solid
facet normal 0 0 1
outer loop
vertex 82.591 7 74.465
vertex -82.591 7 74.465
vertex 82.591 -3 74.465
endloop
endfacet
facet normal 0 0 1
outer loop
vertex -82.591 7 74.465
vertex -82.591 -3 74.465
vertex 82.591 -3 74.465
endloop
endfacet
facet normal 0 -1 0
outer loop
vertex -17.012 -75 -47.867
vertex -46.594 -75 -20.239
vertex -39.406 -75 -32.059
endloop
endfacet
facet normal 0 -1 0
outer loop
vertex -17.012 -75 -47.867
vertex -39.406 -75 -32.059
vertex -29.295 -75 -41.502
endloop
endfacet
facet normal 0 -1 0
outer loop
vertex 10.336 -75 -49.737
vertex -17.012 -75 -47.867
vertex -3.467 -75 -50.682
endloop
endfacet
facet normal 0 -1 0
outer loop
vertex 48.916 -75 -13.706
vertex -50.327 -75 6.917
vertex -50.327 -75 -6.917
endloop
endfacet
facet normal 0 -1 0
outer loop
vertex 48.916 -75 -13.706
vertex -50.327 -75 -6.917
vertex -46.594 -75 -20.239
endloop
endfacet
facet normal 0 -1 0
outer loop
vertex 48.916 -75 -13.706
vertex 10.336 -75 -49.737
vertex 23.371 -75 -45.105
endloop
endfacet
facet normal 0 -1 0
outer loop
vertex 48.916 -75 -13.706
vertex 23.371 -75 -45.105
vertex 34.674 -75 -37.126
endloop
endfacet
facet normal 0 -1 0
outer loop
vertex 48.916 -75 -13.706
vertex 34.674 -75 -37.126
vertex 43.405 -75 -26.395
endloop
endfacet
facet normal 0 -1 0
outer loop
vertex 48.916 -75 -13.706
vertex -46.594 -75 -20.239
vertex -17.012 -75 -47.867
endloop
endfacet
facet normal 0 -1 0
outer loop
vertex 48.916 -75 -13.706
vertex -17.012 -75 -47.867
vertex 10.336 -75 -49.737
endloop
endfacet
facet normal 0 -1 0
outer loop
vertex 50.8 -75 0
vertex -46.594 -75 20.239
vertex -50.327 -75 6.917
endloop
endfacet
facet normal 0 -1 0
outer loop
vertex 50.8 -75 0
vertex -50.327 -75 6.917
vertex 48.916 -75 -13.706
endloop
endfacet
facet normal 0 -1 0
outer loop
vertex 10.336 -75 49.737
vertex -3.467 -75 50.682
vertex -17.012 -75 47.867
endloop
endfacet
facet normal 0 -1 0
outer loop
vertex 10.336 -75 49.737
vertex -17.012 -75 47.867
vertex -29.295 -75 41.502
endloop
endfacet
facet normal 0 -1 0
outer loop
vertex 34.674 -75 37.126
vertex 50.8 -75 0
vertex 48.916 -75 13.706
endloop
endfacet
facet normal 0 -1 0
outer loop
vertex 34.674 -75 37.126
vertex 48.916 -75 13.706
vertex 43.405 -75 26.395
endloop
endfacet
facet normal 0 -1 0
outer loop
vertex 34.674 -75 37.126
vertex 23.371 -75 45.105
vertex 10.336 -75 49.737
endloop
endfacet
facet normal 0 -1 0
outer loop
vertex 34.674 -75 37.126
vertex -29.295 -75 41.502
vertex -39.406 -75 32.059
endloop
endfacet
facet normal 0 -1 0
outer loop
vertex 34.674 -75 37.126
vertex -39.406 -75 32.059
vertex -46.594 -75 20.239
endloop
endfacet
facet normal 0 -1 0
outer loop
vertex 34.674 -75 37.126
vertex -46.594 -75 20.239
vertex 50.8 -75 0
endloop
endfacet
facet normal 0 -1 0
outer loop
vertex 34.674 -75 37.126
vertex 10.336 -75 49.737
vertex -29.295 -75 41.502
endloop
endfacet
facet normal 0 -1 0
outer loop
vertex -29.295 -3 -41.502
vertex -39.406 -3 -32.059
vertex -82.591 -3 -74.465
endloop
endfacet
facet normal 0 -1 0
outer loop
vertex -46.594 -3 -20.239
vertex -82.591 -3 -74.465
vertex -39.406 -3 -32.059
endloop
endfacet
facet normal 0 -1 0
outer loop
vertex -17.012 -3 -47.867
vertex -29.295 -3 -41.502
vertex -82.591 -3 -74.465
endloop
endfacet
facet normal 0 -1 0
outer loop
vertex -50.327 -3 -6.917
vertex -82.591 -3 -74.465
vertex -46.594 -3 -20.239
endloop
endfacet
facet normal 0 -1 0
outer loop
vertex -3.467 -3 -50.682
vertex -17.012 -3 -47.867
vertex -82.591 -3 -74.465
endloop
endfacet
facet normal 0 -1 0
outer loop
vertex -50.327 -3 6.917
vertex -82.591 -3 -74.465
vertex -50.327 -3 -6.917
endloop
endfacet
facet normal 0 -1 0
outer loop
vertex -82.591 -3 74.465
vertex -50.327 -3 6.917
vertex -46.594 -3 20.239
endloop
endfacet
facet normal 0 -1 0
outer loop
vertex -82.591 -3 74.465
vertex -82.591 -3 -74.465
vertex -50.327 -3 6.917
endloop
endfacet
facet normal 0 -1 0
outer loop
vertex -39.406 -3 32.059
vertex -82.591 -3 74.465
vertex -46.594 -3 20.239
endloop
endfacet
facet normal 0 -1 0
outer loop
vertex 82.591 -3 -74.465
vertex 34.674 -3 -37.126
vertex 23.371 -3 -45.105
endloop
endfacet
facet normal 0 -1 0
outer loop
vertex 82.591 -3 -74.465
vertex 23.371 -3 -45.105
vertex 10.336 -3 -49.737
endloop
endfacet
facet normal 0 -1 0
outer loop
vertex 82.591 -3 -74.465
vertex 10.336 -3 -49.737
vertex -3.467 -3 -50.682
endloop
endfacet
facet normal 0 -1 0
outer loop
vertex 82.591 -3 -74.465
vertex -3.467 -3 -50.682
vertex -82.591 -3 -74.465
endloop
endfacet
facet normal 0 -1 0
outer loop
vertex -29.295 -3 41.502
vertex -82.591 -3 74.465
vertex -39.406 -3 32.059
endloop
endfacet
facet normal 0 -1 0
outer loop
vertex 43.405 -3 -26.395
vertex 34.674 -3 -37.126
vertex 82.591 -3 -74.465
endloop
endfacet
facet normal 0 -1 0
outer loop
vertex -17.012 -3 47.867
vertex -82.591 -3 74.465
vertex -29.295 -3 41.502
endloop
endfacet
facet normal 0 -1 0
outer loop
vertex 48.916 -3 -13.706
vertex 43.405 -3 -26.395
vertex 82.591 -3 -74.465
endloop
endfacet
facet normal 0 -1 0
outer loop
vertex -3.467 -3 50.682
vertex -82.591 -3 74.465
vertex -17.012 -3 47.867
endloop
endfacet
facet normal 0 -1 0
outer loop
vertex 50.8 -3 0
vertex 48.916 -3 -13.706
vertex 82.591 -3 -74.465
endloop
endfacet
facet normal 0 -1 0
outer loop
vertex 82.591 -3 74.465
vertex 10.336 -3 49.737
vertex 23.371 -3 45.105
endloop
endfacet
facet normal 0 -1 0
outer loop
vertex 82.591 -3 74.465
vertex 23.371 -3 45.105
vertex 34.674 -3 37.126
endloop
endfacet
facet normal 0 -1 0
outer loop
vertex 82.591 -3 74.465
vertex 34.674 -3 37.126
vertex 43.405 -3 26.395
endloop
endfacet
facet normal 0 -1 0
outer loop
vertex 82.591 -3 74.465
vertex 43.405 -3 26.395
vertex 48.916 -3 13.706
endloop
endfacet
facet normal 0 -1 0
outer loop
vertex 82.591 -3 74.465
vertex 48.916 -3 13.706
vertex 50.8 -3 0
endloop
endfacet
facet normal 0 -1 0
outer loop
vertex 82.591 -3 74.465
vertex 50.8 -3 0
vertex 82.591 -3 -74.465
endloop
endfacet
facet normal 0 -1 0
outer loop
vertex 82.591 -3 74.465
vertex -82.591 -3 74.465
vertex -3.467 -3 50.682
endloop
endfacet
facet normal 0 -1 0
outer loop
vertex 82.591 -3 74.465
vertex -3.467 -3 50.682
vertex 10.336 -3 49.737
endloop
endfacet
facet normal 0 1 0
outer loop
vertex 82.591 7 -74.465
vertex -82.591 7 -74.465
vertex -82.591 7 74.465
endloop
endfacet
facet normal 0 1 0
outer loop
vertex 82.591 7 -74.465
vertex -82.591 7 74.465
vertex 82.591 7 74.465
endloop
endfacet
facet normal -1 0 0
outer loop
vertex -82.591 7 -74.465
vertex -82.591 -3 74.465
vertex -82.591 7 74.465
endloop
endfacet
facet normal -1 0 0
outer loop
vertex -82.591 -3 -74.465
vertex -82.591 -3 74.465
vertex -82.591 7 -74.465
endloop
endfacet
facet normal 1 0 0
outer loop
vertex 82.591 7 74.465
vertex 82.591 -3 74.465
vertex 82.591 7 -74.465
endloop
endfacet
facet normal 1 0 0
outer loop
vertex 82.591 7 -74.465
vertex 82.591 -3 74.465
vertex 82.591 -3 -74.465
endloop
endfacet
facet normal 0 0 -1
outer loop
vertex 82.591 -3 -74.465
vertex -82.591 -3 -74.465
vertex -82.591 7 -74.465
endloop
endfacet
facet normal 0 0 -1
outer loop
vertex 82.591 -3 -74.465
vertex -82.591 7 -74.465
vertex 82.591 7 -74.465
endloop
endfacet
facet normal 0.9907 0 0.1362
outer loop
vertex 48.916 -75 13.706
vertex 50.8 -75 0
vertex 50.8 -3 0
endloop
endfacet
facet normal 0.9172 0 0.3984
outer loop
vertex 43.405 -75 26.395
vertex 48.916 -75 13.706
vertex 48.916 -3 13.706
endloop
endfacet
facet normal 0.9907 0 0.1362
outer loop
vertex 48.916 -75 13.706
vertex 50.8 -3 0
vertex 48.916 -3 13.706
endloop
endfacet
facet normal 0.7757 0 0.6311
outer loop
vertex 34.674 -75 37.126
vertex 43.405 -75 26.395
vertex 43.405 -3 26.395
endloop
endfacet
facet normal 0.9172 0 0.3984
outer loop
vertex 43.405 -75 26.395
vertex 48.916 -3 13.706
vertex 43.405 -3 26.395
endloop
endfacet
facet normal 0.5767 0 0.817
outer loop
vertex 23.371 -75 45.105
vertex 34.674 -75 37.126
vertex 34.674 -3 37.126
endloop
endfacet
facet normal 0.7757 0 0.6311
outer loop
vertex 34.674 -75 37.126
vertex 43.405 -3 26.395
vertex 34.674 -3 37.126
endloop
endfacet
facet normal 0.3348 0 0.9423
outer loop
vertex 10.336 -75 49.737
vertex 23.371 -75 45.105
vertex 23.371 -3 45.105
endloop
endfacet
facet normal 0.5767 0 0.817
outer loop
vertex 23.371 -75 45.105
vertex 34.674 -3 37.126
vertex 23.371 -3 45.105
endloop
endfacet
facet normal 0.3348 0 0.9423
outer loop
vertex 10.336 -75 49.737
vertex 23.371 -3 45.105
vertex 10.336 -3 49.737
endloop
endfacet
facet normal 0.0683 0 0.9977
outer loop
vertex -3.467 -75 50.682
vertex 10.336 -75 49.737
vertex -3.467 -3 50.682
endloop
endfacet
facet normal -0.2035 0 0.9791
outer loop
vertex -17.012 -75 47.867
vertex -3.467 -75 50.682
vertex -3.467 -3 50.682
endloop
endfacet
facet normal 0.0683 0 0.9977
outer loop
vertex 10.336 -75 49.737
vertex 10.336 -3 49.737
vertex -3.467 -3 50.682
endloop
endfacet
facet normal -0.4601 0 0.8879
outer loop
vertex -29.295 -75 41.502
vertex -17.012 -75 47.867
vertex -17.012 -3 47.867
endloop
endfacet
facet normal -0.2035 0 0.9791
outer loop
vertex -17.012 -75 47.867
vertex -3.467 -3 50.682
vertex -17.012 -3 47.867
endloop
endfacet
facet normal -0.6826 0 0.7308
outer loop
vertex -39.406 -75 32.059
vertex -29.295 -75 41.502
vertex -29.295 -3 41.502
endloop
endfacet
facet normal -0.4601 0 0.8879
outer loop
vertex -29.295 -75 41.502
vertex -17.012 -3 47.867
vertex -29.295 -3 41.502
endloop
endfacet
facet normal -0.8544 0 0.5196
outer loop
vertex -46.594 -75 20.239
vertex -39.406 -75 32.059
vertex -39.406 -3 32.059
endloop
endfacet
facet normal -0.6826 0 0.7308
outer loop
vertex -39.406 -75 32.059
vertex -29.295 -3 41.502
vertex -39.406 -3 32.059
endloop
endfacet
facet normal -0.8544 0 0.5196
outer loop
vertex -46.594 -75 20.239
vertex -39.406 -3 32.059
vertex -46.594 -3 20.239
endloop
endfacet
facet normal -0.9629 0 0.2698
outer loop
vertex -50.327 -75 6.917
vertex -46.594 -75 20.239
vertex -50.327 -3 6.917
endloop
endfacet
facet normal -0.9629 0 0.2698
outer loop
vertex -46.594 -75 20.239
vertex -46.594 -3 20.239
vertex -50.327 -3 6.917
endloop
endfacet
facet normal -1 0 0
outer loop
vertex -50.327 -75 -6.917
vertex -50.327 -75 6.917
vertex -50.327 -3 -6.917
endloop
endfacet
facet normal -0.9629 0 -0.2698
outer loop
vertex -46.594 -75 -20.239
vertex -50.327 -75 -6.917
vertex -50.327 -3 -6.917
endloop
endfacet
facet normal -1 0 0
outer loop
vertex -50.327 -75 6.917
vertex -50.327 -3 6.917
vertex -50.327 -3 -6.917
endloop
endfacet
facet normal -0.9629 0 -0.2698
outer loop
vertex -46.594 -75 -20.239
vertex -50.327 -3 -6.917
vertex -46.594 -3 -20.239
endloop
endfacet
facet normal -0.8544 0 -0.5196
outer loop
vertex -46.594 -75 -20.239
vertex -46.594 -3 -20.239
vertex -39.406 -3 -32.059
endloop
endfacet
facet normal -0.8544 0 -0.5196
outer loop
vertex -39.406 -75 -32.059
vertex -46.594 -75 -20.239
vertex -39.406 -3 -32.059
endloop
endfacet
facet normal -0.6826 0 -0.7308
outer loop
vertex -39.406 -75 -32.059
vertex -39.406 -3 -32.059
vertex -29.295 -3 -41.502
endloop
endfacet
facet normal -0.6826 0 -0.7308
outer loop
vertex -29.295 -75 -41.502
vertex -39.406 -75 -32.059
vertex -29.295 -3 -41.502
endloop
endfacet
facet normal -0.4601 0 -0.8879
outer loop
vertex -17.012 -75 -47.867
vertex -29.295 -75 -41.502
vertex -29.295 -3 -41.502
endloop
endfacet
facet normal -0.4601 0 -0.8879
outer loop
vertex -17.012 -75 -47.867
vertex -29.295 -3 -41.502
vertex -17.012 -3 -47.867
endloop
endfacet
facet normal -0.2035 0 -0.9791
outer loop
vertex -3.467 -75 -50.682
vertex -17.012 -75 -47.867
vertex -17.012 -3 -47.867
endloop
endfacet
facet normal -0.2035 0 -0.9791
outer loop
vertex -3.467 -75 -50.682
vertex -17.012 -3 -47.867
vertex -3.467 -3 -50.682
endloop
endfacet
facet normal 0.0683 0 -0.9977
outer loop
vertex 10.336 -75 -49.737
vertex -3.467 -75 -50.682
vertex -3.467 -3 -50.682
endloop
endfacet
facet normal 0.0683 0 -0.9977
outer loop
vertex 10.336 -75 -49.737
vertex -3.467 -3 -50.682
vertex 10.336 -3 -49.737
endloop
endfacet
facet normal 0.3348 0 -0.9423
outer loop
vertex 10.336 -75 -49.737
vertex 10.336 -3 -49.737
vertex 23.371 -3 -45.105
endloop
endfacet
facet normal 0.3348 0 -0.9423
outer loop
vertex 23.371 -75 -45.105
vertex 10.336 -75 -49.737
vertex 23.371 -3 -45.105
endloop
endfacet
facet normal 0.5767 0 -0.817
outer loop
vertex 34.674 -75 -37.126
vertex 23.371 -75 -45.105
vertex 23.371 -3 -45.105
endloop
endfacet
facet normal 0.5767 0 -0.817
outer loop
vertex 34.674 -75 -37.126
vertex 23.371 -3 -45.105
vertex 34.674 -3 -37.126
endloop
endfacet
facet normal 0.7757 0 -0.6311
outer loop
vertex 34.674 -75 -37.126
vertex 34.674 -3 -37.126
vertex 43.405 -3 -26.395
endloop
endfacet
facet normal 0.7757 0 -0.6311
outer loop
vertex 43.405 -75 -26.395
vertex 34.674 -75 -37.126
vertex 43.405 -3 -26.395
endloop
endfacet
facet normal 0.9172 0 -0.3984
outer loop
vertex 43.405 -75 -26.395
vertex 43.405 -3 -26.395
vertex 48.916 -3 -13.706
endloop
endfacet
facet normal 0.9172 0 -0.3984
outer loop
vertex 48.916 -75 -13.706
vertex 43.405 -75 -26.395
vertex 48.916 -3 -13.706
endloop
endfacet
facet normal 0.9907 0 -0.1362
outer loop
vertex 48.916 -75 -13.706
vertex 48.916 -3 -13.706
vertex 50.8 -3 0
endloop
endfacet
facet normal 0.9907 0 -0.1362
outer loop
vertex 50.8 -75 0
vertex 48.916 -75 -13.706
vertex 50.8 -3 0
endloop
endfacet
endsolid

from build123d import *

# Parameters (mm, degrees)
F0_W      = 165.181708
F0_H      = 148.92931
F0_R      = 50.8
F1_DEPTH  = 3
F2_DEPTH  = 75
F1_FACE_W = 165.181708
F1_FACE_H = 148.92931
F3_DEPTH  = 7


with BuildPart() as f1:
    # F0 (on Front) → F1 (new body)
    with BuildSketch(Plane.XZ):
        Rectangle(F0_W, F0_H)
        Circle(F0_R, mode=Mode.SUBTRACT)
        Circle(F0_R)
    extrude(amount=F1_DEPTH)

    # F0 (on Front) → F2 (join)
    with BuildSketch(Plane.XZ):
        Circle(F0_R)
    extrude(amount=F2_DEPTH)

    # F1_face (on face) → F3 (join)
    with BuildSketch(Plane(origin=(0, 0, 0), x_dir=(1, 0, 0), z_dir=(0, 1, 0))):
        Rectangle(F1_FACE_W, F1_FACE_H)
    extrude(amount=F3_DEPTH)


solid = f1.part
